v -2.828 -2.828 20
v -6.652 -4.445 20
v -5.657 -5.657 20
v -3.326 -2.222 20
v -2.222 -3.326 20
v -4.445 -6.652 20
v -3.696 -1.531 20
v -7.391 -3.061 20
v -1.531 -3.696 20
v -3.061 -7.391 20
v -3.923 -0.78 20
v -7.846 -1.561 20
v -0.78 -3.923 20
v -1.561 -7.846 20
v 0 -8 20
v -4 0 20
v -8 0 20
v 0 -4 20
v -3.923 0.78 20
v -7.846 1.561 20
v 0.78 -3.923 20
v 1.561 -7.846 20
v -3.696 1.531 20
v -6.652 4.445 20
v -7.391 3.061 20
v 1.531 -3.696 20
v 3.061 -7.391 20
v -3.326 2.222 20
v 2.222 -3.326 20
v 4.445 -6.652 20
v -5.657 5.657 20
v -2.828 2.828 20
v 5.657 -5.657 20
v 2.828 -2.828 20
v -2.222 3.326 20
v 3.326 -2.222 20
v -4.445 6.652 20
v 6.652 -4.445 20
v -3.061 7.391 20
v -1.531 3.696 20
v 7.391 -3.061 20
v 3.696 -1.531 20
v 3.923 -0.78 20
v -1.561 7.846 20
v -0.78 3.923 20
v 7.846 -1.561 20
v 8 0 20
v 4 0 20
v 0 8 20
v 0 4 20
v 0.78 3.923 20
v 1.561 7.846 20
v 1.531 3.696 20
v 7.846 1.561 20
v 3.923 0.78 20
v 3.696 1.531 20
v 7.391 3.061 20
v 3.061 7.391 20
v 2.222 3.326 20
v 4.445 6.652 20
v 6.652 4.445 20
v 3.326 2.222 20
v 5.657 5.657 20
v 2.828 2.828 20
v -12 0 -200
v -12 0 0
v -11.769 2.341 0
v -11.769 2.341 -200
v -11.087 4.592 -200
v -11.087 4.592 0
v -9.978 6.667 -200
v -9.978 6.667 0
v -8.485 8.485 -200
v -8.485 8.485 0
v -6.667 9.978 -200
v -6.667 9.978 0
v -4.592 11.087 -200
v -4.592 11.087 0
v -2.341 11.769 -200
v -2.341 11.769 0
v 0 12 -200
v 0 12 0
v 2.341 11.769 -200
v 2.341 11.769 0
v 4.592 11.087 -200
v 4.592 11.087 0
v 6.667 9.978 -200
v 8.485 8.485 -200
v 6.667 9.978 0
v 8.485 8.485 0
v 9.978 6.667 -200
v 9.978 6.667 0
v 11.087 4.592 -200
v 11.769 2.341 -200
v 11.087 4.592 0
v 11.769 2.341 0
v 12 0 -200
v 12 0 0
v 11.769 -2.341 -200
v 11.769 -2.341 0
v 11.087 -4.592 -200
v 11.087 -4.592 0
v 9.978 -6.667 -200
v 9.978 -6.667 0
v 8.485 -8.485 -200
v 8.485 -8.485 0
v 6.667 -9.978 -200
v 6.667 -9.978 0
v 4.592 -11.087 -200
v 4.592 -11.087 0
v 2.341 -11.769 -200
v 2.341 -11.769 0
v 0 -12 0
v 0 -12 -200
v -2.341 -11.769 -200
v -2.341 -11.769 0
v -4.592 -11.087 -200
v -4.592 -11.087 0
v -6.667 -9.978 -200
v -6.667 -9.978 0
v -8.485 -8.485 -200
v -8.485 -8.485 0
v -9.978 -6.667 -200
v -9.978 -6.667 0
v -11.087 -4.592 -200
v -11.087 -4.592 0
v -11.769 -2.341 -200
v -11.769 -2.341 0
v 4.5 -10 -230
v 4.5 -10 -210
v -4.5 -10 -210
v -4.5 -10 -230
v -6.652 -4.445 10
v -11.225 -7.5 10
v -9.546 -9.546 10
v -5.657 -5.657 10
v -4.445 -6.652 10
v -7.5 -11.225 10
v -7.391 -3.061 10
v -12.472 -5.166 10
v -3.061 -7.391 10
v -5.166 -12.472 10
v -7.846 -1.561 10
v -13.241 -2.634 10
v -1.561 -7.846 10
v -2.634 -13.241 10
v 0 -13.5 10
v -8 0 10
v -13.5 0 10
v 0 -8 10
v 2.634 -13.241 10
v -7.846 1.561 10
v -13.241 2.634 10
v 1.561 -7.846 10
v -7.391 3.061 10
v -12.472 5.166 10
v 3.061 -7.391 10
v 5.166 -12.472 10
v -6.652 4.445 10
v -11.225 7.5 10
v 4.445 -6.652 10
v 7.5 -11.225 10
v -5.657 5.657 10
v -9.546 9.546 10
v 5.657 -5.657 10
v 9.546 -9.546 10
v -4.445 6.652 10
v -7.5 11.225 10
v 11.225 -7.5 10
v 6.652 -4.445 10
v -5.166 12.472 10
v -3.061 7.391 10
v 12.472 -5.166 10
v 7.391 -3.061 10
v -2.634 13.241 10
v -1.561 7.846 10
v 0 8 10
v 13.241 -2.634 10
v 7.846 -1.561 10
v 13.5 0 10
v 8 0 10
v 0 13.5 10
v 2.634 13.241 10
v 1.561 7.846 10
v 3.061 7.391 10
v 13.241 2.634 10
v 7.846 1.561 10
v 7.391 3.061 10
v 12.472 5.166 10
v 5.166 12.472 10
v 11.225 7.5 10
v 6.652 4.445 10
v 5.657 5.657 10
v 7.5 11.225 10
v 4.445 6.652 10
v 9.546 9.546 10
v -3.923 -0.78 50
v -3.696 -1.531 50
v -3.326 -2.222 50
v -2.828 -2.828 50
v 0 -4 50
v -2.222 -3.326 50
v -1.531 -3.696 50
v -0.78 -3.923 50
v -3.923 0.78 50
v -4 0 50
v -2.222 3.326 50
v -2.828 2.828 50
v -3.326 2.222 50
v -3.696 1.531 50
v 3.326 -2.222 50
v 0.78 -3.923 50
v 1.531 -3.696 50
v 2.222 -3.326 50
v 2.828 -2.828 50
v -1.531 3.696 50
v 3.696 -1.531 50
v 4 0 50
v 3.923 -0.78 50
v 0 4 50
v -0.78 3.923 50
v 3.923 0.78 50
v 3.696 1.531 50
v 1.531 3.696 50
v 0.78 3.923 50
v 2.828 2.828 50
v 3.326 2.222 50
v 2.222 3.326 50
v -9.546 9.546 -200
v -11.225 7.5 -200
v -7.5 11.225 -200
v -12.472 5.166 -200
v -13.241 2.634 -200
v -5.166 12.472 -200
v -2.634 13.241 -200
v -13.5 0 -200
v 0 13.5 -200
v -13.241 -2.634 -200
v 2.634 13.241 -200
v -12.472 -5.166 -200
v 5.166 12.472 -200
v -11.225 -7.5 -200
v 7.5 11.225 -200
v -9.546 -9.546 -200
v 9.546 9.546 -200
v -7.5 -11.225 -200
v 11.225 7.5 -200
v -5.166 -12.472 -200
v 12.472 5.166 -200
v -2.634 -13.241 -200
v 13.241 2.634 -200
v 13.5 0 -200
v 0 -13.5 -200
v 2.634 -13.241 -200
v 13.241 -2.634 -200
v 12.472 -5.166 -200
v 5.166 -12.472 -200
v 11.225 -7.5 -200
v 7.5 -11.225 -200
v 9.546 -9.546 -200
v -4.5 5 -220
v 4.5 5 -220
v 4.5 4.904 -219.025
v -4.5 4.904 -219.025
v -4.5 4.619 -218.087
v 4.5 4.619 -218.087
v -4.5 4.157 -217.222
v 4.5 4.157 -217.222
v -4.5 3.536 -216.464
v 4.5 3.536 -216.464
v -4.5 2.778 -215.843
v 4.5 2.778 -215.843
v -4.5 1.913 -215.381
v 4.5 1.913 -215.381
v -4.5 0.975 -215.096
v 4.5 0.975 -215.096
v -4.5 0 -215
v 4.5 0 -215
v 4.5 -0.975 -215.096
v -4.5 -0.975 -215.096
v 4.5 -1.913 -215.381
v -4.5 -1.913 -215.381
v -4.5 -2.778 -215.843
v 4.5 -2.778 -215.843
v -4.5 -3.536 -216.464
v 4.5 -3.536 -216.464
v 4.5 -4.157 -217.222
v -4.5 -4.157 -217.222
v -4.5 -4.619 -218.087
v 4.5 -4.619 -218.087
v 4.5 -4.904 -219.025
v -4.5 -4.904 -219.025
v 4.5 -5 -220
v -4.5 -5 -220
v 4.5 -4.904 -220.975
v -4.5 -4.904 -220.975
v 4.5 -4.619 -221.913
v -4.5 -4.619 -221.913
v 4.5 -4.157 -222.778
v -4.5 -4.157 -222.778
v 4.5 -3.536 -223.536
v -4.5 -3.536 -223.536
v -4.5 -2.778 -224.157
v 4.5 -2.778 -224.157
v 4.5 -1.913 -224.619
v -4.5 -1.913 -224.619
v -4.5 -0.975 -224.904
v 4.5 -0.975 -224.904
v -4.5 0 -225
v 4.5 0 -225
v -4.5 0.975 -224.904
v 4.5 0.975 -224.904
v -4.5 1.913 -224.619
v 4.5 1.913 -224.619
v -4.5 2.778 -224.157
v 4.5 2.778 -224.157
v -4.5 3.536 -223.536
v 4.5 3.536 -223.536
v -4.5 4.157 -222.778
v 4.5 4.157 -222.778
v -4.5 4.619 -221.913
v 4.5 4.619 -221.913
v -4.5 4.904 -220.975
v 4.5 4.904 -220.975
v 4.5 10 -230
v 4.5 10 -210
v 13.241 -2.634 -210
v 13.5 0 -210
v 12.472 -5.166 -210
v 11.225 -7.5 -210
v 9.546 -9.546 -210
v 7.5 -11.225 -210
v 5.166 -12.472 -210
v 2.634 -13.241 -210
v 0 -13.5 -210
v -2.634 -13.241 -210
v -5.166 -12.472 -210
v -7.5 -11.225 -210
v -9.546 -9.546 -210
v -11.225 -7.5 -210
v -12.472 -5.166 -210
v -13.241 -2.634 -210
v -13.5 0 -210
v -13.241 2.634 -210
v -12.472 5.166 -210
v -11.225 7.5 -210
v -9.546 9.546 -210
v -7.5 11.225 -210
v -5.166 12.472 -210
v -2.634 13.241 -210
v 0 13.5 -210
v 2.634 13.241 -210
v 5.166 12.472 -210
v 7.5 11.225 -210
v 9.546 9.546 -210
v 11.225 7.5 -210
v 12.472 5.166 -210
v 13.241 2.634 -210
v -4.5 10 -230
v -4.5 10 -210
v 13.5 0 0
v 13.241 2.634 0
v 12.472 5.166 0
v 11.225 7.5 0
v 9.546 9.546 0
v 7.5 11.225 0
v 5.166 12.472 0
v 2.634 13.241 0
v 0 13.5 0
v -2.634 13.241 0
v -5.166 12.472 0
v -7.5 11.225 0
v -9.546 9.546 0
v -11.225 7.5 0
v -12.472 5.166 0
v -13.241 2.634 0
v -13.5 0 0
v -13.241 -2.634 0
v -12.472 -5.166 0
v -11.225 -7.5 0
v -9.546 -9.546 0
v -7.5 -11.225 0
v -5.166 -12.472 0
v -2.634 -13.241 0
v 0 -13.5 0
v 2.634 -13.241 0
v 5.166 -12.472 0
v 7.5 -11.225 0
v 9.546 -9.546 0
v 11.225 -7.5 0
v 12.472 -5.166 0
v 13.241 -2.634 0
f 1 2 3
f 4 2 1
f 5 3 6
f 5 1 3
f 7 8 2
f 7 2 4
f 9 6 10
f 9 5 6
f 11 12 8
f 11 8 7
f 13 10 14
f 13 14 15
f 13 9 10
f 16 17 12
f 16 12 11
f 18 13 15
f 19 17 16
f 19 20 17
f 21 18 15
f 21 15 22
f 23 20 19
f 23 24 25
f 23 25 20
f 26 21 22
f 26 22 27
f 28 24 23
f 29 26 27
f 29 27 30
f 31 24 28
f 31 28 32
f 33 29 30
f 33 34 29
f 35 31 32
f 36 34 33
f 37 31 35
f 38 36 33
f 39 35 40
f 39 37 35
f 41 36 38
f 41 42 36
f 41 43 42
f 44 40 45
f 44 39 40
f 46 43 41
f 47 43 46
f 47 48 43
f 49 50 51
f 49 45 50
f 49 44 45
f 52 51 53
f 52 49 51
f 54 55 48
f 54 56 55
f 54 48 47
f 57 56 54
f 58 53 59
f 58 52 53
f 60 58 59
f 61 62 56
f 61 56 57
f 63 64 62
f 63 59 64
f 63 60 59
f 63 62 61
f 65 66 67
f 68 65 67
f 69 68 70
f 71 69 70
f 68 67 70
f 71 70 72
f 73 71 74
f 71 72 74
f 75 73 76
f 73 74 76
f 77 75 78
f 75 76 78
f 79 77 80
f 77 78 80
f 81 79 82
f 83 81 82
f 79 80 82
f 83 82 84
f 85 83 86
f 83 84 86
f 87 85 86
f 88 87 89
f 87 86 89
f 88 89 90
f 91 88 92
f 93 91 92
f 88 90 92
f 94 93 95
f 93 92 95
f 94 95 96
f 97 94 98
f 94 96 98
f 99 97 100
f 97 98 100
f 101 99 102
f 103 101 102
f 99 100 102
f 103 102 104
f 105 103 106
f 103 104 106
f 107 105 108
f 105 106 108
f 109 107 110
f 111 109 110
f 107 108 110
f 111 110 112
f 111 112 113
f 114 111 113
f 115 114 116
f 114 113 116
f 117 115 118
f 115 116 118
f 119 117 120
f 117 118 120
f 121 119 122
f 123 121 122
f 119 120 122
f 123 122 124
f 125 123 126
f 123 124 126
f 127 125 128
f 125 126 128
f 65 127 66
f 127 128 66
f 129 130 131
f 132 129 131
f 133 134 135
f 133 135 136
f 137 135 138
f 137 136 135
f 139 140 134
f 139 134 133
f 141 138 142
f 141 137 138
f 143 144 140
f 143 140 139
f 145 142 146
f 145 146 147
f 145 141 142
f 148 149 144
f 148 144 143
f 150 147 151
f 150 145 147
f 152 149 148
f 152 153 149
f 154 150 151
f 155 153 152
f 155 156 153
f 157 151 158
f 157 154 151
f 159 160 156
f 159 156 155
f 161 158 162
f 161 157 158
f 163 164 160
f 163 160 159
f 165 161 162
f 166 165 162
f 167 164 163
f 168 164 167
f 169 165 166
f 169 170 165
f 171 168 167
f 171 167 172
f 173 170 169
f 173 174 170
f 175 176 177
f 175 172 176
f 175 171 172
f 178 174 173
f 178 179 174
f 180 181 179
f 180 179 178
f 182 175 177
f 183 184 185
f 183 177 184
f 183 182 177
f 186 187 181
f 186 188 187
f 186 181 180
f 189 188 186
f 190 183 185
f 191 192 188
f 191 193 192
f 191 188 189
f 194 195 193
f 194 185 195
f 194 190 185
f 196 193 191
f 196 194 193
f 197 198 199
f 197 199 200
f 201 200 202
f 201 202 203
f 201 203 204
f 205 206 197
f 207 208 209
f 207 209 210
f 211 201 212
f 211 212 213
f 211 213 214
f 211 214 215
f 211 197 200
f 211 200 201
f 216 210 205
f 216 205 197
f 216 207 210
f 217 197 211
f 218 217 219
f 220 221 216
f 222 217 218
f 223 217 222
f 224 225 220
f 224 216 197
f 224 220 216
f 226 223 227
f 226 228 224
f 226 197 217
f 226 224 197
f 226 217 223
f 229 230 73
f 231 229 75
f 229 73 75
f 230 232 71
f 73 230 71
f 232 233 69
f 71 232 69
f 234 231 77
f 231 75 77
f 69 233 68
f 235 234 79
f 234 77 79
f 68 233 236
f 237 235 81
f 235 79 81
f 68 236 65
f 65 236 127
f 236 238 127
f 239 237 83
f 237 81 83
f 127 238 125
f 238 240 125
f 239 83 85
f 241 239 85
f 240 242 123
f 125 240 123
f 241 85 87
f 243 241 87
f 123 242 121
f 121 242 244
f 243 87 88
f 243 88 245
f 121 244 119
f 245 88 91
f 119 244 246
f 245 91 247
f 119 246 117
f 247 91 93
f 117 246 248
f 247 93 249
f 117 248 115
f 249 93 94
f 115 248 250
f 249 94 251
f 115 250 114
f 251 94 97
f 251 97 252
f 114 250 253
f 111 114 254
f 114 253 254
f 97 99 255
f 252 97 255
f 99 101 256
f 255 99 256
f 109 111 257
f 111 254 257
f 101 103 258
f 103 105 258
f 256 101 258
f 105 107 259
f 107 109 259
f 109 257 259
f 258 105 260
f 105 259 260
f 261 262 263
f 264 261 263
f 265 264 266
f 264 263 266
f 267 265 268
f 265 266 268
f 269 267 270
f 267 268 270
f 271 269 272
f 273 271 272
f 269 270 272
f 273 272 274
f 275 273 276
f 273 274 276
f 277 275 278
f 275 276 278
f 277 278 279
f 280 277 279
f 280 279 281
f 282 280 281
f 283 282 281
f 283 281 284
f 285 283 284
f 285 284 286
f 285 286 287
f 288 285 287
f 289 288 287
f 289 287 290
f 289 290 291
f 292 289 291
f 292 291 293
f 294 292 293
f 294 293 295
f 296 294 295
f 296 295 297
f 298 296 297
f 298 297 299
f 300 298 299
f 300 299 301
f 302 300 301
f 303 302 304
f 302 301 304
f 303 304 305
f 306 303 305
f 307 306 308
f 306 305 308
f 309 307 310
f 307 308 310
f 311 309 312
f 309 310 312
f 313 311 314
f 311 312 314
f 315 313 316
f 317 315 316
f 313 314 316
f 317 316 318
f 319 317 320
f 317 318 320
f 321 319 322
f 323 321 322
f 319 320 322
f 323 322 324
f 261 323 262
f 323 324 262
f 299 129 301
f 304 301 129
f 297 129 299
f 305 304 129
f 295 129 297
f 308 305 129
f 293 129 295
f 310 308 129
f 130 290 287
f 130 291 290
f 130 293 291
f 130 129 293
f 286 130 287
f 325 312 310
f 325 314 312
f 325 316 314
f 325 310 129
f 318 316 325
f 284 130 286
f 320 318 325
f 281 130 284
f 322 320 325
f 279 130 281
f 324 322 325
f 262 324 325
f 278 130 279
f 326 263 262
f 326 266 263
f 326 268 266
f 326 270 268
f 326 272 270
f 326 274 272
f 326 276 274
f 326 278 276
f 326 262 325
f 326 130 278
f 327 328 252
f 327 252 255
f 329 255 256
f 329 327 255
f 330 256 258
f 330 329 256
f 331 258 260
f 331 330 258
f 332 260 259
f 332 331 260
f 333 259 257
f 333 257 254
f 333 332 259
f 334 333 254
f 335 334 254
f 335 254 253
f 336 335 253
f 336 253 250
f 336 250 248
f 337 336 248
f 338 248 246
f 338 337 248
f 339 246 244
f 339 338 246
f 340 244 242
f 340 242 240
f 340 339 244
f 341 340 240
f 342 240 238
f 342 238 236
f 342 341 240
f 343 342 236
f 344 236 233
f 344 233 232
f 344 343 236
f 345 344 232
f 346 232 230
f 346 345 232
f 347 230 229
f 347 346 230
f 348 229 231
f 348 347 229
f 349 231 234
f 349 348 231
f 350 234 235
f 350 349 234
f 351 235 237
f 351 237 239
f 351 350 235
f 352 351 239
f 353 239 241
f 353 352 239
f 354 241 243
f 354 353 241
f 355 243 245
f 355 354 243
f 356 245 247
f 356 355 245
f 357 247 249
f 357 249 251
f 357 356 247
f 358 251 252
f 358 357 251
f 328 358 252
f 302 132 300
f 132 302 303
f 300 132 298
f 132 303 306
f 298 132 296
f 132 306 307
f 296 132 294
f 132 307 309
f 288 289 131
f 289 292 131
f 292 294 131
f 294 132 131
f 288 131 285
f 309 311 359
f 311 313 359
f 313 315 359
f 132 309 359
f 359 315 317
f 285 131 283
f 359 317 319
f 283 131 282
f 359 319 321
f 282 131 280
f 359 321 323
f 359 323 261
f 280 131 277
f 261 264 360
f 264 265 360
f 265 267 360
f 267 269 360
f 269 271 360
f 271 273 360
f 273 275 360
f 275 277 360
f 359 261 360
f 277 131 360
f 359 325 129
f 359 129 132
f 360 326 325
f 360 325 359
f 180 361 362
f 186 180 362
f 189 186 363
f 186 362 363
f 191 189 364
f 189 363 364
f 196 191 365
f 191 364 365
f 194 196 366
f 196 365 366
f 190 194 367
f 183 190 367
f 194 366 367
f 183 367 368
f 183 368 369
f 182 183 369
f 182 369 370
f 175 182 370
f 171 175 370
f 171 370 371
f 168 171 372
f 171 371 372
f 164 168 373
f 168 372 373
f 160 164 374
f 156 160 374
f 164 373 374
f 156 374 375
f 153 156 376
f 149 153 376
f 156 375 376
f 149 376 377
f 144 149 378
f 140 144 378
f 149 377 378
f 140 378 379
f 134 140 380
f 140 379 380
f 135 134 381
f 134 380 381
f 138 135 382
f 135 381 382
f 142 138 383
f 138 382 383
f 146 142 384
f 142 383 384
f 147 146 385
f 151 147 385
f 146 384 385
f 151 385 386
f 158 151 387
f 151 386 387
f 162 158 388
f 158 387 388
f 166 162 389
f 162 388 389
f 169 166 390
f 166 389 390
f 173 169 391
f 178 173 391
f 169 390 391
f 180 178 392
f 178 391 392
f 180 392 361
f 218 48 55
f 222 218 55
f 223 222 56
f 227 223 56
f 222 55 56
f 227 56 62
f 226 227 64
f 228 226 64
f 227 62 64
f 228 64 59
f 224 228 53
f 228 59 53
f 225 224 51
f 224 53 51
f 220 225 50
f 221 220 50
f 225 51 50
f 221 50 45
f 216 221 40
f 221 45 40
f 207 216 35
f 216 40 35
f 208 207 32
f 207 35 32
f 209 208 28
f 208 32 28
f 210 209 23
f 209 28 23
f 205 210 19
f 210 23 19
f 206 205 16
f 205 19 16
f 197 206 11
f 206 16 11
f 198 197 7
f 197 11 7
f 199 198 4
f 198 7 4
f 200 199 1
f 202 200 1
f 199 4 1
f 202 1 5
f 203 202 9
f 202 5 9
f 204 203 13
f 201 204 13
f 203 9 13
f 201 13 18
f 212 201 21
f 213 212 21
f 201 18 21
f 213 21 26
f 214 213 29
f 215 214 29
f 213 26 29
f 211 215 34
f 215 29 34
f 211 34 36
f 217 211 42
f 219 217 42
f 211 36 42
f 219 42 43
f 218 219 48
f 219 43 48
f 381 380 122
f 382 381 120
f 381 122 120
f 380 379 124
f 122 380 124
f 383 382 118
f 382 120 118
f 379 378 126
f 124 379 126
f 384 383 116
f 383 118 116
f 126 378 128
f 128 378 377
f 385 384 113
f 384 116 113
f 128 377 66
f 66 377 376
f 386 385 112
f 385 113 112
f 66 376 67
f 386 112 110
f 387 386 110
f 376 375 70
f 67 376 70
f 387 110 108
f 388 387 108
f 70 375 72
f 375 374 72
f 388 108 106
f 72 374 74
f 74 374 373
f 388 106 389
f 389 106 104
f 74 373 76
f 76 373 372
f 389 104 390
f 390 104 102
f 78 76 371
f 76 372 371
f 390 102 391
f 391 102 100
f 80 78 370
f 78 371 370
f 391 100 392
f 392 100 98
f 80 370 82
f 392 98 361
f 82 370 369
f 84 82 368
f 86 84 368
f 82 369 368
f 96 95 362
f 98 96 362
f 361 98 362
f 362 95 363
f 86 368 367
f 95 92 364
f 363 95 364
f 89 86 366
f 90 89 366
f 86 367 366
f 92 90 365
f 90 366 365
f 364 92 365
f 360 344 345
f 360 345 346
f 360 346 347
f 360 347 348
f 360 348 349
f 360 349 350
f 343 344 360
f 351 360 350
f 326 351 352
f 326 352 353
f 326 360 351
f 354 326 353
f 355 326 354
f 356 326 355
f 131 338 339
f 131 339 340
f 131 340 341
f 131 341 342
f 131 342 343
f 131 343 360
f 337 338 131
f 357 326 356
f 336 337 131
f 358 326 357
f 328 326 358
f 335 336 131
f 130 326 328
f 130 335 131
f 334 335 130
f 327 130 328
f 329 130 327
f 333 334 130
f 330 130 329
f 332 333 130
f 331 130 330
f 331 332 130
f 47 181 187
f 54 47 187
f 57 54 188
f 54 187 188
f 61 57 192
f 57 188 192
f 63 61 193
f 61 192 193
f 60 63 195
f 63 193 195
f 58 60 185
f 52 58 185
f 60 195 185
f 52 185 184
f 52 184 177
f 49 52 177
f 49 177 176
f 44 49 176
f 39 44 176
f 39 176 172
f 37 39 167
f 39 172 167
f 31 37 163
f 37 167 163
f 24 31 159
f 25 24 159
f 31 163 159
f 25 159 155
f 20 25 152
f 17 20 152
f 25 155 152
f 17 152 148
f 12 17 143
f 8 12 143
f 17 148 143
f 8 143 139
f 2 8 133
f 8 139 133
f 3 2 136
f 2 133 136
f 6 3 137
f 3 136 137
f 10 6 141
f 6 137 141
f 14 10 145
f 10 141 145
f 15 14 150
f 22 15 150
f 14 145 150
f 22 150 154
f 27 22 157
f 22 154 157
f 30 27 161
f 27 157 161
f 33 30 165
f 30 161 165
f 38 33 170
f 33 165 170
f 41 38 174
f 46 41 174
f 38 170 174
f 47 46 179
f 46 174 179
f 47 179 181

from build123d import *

# Parameters (mm, degrees)
SKETCH1_R           = 13.5
BOSS_EXTRUDE1_DEPTH = 10
SKETCH2_R           = 8
BOSS_EXTRUDE2_DEPTH = 10
SKETCH3_R           = 12
BOSS_EXTRUDE3_DEPTH = 200
BOSS_EXTRUDE4_START = 10
SKETCH4_R           = 13.5
BOSS_EXTRUDE4_DEPTH = 10
SKETCH5_W           = 9
SKETCH5_H           = 20
BOSS_EXTRUDE5_DEPTH = 20
SKETCH6_R           = 5
CUT_EXTRUDE1_DEPTH  = 20
SKETCH8_R           = 4
BOSS_EXTRUDE6_DEPTH = 30


with BuildPart() as part:
    # Sketch1 → Boss-Extrude1 (new body)
    with BuildSketch(Plane.XY):
        Circle(SKETCH1_R)
    extrude(amount=BOSS_EXTRUDE1_DEPTH)

    # Sketch2 → Boss-Extrude2 (add)
    with BuildSketch(Plane.XY.offset(10)):
        Circle(SKETCH2_R)
    extrude(amount=BOSS_EXTRUDE2_DEPTH)

    # Sketch3 → Boss-Extrude3 (add)
    with BuildSketch(Plane(origin=(0, 0, 0), x_dir=(-1, 0, 0), z_dir=(0, 0, -1))):
        Circle(SKETCH3_R)
    extrude(amount=BOSS_EXTRUDE3_DEPTH)

    # Sketch4 → Boss-Extrude4 (add)
    with BuildSketch(Plane(origin=(0, 0, -200), x_dir=(-1, 0, 0), z_dir=(0, 0, -1)).offset(BOSS_EXTRUDE4_START)):
        with Locations(Location((0, 0, 0), (0, 0, 180))):
            Circle(SKETCH4_R)
    extrude(amount=-BOSS_EXTRUDE4_DEPTH)

    # Sketch5 → Boss-Extrude5 (add)
    with BuildSketch(Plane(origin=(0, 0, -210), x_dir=(-1, 0, 0), z_dir=(0, 0, -1))):
        Rectangle(SKETCH5_W, SKETCH5_H)
    extrude(amount=BOSS_EXTRUDE5_DEPTH)

    # Sketch6 → Cut-Extrude1 (cut)
    with BuildSketch(Plane(origin=(4.5, 0, 0), x_dir=(0, 0, -1), z_dir=(1, 0, 0))):
        with Locations(Location((220, 0, 0), (0, 0, 90))):
            Circle(SKETCH6_R)
    extrude(amount=-CUT_EXTRUDE1_DEPTH, mode=Mode.SUBTRACT)

    # Sketch8 → Boss-Extrude6 (add)
    with BuildSketch(Plane.XY.offset(20)):
        Circle(SKETCH8_R)
    extrude(amount=BOSS_EXTRUDE6_DEPTH)


solid = part.part
